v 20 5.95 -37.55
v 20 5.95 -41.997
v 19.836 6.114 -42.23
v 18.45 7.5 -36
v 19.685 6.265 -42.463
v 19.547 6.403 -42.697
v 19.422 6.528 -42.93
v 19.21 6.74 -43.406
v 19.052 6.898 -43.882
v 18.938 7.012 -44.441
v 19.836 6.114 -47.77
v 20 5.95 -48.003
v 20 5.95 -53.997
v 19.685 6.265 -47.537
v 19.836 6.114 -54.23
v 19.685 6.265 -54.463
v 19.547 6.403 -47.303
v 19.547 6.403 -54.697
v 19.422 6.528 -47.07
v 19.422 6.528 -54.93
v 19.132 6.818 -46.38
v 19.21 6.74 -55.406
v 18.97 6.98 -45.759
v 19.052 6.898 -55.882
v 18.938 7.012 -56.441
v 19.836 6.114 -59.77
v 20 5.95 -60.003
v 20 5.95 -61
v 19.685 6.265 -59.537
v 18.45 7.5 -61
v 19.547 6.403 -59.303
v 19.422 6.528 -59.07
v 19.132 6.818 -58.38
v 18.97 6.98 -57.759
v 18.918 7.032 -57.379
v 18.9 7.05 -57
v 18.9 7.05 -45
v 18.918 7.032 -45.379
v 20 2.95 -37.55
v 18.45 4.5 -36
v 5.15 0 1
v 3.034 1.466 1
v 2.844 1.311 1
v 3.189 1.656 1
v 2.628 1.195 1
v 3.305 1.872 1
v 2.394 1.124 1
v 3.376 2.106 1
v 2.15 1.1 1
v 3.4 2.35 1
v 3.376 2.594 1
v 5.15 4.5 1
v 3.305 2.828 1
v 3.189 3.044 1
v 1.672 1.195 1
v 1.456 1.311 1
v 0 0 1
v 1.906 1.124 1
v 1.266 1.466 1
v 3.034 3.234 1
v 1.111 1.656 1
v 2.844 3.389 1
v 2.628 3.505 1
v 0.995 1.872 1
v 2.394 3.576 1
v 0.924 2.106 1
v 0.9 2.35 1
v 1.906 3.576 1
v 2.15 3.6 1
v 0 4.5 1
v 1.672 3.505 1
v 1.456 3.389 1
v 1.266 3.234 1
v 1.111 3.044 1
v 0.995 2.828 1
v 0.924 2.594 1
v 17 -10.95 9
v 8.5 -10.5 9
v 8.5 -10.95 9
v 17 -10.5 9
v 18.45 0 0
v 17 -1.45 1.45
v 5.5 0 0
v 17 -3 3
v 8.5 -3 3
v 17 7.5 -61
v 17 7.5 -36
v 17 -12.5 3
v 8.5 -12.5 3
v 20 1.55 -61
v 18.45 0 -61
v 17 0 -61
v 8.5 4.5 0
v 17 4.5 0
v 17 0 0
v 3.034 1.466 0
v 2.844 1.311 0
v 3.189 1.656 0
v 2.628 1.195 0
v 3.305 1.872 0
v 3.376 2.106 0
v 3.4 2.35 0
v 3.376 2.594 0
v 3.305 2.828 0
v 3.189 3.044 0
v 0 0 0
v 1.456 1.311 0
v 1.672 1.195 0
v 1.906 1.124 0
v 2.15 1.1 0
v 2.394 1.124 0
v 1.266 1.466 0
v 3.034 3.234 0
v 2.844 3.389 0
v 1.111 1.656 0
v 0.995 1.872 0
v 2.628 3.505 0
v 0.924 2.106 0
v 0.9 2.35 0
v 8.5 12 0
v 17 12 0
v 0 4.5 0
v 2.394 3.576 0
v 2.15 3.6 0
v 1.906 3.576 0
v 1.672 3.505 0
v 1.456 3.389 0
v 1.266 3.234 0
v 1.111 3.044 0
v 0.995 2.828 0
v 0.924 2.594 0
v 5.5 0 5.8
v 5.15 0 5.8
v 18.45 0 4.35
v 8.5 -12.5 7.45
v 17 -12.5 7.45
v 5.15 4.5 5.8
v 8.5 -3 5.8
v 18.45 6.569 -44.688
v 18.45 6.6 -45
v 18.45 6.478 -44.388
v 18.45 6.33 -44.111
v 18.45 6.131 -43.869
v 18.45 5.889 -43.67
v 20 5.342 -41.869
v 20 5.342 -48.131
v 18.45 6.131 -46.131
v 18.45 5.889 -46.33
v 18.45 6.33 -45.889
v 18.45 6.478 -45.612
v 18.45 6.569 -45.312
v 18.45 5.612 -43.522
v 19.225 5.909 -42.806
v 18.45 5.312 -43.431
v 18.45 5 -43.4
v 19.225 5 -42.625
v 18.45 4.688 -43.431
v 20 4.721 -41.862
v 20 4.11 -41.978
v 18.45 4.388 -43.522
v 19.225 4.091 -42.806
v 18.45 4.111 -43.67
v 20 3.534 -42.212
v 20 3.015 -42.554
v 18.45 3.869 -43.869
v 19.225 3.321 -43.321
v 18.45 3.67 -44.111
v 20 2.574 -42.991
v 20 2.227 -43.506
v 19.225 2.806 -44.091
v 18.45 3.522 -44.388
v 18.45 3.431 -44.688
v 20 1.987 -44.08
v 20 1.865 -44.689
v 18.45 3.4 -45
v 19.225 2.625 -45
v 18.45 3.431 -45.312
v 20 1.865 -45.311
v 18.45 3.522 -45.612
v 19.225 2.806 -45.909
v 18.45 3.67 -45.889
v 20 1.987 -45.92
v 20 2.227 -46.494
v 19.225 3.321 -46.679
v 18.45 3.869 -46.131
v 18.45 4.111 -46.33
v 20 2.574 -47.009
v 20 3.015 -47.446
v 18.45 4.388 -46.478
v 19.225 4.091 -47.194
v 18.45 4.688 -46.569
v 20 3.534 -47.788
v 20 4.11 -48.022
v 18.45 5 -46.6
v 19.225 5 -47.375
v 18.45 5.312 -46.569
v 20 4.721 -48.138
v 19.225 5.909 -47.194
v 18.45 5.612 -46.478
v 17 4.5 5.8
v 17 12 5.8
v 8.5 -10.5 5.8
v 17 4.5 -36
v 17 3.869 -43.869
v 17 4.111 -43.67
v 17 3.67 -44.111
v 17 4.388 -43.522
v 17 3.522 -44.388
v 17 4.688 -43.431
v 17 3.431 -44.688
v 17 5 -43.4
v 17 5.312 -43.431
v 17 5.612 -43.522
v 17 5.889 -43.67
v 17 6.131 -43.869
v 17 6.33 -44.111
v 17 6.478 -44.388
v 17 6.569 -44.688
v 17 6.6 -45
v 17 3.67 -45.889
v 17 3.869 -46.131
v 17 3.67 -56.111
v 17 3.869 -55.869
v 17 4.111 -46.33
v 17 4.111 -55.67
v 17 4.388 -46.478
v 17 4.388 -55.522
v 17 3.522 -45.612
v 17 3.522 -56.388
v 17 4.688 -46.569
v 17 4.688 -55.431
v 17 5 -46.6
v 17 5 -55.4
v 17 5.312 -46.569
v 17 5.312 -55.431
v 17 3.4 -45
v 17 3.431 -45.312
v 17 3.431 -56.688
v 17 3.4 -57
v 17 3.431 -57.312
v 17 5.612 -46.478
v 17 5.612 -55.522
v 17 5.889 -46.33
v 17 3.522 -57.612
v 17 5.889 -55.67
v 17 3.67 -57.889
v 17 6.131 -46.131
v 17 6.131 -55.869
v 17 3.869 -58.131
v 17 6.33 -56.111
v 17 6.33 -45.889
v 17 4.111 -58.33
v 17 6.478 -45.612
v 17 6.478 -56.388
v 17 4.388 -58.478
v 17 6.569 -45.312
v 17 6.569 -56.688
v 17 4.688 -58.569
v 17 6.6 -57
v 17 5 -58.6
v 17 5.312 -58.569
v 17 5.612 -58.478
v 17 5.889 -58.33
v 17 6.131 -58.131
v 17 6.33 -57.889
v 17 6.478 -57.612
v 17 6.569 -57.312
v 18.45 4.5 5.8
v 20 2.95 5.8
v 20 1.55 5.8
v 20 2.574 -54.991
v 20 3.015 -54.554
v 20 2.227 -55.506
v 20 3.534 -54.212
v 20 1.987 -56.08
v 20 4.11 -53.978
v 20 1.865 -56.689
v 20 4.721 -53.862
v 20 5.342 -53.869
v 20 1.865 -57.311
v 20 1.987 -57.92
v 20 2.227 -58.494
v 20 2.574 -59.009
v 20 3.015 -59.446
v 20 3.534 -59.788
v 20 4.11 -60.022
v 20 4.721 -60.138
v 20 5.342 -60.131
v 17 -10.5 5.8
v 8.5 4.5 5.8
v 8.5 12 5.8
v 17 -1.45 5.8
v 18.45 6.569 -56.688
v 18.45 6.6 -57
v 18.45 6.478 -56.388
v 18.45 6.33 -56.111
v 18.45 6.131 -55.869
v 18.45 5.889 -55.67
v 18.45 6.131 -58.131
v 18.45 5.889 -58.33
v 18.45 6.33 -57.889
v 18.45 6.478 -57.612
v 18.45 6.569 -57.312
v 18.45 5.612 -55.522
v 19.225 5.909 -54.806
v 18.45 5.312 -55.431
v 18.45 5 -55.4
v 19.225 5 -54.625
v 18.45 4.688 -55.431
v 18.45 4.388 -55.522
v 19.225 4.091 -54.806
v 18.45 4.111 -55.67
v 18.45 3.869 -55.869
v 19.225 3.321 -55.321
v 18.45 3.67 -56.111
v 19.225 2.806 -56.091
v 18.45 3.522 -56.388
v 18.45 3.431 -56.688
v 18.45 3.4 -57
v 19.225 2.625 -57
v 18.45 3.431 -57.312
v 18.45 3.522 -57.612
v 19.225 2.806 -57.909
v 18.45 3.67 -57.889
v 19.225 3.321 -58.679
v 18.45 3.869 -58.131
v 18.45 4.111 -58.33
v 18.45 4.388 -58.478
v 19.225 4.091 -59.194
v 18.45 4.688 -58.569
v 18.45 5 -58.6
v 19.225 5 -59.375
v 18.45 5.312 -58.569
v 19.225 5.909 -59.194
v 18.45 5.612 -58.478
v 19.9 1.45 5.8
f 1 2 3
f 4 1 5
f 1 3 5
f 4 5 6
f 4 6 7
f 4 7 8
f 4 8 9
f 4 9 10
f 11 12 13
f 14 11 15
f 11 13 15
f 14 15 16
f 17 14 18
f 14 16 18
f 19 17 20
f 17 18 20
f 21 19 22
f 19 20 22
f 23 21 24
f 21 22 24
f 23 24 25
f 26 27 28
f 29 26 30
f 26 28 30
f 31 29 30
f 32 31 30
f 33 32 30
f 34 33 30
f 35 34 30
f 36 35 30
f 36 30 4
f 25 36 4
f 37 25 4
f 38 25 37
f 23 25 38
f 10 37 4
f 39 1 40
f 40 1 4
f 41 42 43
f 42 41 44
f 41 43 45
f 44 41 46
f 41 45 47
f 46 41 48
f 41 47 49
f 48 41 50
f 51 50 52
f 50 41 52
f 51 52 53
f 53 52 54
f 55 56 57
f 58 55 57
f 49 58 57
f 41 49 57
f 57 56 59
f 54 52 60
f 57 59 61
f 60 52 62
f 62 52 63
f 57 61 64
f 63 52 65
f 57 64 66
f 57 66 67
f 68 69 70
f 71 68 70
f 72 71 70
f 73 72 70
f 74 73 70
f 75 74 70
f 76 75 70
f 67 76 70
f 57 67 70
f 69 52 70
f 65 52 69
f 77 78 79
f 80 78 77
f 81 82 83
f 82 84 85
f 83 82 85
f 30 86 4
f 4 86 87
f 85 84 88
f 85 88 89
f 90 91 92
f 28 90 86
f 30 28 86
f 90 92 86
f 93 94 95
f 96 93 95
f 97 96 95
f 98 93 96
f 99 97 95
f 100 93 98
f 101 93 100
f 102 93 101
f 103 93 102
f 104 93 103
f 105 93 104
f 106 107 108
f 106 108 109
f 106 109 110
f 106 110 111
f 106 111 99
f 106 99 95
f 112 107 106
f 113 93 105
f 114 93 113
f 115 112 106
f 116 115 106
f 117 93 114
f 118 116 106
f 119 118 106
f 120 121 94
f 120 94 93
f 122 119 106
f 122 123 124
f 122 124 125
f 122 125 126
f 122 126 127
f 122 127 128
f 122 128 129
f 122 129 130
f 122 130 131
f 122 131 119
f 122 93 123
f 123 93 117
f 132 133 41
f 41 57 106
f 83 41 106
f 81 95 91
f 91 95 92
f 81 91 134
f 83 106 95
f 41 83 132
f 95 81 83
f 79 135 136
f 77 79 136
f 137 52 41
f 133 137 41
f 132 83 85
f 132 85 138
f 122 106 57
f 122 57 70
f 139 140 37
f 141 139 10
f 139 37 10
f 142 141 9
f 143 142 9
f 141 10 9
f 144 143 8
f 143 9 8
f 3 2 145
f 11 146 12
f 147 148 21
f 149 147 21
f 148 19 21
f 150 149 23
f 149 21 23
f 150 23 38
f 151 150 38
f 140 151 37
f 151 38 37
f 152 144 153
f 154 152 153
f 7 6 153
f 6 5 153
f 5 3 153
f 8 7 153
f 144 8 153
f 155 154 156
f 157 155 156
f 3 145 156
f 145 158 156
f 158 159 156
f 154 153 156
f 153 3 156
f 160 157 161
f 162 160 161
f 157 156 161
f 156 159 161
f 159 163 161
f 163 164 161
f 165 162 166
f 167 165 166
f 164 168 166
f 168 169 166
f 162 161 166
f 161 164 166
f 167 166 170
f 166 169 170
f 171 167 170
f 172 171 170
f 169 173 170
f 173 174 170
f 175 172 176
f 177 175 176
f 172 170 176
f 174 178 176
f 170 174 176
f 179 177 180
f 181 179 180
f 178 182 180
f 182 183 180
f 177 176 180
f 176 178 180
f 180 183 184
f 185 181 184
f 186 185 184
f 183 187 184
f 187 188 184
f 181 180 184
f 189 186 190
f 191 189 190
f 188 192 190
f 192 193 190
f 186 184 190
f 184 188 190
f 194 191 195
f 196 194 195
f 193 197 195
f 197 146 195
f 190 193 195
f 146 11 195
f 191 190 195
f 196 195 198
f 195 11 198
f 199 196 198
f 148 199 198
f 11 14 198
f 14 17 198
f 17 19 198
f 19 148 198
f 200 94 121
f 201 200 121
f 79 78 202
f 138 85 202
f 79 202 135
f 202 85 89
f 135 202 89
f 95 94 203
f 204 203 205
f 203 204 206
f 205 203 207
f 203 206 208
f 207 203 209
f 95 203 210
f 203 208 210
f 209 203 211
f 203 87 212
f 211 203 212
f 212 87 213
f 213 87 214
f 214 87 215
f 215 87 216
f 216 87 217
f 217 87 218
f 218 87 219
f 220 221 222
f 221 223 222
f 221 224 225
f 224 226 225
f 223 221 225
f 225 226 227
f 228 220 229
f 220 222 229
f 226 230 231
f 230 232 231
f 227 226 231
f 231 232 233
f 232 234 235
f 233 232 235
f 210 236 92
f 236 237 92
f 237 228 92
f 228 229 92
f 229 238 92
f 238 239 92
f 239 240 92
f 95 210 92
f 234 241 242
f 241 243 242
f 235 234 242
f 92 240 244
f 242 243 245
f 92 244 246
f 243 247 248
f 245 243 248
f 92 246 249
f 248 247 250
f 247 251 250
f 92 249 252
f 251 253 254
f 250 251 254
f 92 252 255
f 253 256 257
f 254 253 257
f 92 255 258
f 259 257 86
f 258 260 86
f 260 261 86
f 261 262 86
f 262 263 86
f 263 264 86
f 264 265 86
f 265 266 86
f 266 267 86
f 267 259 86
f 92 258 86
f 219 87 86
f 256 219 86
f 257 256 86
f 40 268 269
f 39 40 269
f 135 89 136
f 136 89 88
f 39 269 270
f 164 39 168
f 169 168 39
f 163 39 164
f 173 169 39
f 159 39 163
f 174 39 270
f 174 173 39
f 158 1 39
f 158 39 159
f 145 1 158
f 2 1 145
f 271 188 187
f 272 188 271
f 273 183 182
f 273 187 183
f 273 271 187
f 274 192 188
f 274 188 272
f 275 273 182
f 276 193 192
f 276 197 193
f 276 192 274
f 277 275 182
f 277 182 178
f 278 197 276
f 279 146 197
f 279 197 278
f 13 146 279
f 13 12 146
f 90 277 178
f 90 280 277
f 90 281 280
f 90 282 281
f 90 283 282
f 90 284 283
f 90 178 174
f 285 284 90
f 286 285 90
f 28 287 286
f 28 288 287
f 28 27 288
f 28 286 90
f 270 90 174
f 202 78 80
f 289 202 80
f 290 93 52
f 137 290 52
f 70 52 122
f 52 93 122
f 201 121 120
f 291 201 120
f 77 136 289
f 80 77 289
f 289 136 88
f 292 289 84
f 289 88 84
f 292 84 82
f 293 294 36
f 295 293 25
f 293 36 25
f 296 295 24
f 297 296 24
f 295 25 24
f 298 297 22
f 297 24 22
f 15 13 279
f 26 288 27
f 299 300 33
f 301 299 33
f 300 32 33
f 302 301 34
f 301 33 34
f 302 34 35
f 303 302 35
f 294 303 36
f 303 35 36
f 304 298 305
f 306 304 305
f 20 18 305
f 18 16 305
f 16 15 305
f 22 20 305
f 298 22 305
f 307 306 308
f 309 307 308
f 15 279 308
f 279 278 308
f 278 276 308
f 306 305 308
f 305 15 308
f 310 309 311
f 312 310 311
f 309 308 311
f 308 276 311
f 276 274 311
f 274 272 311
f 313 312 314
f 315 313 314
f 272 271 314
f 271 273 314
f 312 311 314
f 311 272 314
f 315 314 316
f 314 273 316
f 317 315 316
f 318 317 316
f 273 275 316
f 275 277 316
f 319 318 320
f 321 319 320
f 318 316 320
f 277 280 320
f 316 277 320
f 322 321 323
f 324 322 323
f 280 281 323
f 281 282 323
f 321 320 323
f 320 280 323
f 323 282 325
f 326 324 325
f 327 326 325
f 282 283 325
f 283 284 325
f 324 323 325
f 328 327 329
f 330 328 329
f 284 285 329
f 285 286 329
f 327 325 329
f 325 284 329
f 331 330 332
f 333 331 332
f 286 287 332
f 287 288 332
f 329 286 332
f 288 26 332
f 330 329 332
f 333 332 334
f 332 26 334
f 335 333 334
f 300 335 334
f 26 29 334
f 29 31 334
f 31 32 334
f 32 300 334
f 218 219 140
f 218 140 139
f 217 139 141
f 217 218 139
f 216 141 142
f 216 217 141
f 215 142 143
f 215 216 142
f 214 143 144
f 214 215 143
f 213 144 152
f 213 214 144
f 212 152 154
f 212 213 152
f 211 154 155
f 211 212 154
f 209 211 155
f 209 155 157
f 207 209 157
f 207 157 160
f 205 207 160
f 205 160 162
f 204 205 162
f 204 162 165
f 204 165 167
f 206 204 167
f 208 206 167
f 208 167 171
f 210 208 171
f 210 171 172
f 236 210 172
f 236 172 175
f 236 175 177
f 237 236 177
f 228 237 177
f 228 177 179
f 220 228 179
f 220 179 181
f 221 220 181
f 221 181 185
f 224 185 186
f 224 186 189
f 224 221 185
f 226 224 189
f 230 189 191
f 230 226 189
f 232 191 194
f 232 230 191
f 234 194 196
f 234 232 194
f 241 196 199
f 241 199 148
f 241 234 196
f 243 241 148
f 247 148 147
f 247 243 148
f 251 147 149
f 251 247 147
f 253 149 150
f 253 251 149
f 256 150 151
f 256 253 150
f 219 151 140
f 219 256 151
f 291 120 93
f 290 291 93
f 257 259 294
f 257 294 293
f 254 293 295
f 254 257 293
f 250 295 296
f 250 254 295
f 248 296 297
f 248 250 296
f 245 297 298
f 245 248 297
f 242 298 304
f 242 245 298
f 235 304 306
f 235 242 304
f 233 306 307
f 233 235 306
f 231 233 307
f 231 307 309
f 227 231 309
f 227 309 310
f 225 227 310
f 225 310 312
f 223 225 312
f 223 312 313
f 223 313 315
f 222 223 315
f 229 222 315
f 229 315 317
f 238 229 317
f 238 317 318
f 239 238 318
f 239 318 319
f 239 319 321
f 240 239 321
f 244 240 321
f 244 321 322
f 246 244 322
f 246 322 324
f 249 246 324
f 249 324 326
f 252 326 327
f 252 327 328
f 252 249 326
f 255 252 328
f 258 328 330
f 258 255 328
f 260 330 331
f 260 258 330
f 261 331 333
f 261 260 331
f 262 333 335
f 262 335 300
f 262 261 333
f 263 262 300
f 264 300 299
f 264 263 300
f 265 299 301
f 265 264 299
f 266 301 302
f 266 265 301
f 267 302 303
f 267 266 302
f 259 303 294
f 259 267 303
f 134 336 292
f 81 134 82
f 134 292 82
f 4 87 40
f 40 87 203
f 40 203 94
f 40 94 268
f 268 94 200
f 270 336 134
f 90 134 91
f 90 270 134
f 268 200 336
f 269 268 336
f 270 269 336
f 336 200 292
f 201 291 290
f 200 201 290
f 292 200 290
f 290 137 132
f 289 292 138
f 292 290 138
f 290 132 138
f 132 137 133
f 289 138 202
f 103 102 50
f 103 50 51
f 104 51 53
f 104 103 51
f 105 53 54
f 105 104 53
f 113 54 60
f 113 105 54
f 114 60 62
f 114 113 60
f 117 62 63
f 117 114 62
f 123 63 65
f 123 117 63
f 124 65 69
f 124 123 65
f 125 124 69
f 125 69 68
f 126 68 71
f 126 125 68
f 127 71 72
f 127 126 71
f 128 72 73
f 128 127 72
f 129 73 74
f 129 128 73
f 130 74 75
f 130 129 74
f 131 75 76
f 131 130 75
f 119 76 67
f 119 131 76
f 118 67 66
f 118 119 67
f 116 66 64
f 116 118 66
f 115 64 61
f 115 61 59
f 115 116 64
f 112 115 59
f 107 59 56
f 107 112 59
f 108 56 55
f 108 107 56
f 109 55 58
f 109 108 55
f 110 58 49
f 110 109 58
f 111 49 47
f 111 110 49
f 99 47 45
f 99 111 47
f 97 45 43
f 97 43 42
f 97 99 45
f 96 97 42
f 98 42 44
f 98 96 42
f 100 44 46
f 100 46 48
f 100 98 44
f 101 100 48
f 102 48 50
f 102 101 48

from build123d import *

# Parameters (mm, degrees)
SKETCH1_R           = 1.25
BOSS_EXTRUDE1_DEPTH = 1
BOSS_EXTRUDE2_DEPTH = 8
CUT_EXTRUDE1_DEPTH  = 3.2
SKETCH4_R           = 1.6
BOSS_EXTRUDE3_DEPTH = 3
CHAMFER1_SIZE       = 1.55
CHAMFER2_SIZE       = 1.55
CHAMFER3_SIZE       = 1.55
SKETCH5_W           = 8.5
SKETCH5_H           = 12.5
CUT_EXTRUDE2_DEPTH  = 3
CHAMFER4_SIZE       = 3
CHAMFER5_SIZE       = 1.45
SKETCH6_W           = 8.5
SKETCH6_H           = 3.2
CUT_EXTRUDE3_DEPTH  = 69.023892861


# Some blends are built 0.0001 mm under size
with BuildPart() as part:
    # Sketch1 → Boss-Extrude1 (new body)
    with BuildSketch(Plane.XY):
        Polygon((0, 0), (0, 4.5), (8.5, 4.5), (8.5, 12), (17, 12), (17, 0), (17, -12.5), (8.5, -12.5), (8.5, 0), align=None)
        with Locations((2.15, 2.35)):
            Circle(SKETCH1_R, mode=Mode.SUBTRACT)
    extrude(amount=BOSS_EXTRUDE1_DEPTH)

    # Sketch2 → Boss-Extrude2 (add)
    with BuildSketch(Plane.XY.offset(1)):
        Polygon((5.15, 4.5), (5.15, 0), (8.5, 0), (8.5, -12.5), (17, -12.5), (17, 12), (8.5, 12), (8.5, 4.5), align=None)
    extrude(amount=BOSS_EXTRUDE2_DEPTH)

    # Sketch3 → Cut-Extrude1 (cut)
    with BuildSketch(Plane.XY.offset(9)):
        Polygon((8.5, 10), (17, 10), (17, -10.5), (8.5, -10.5), (5.15, -10.5), (5.15, 4.5), (8.5, 4.5), align=None)
    extrude(amount=-CUT_EXTRUDE1_DEPTH, mode=Mode.SUBTRACT)

    # Sketch4 → Boss-Extrude3 (add)
    with BuildSketch(Plane(origin=(17, 0, 0), x_dir=(0, 0, -1), z_dir=(1, 0, 0))):
        Polygon((-5.8, 0), (61, 0), (61, 4.5), (61, 7.5), (36, 7.5), (36, 4.5), (-5.8, 4.5), align=None)
        with Locations(Location((57, 5, 0), (0, 0, 90))):
            Circle(SKETCH4_R, mode=Mode.SUBTRACT)
        with Locations(Location((45, 5, 0), (0, 0, 90))):
            Circle(SKETCH4_R, mode=Mode.SUBTRACT)
    extrude(amount=BOSS_EXTRUDE3_DEPTH)

    # Chamfer1
    # the kernel refuses this chamfer: 1.55 mm, written as the material it takes off along each edge
    with BuildSketch(Plane(origin=(20, 5, -57), x_dir=(0, 1, 0), z_dir=(0, 0, -1))) as chamfer1_piece_1:
        Polygon((1.6, -CHAMFER1_SIZE), (1.6 + CHAMFER1_SIZE, 0), (1.6, 0), align=None)
    revolve(axis=Axis((20, 5, -57), (1, 0, 0)), mode=Mode.SUBTRACT)
    with BuildSketch(Plane(origin=(20, 5, -45), x_dir=(0, 1, 0), z_dir=(0, 0, -1))) as chamfer1_piece_2:
        Polygon((1.6, -CHAMFER1_SIZE), (1.6 + CHAMFER1_SIZE, 0), (1.6, 0), align=None)
    revolve(axis=Axis((20, 5, -45), (1, 0, 0)), mode=Mode.SUBTRACT)

    # Chamfer2
    # the kernel refuses this chamfer: 1.55 mm, written as the material it takes off along each edge
    with BuildSketch(Plane(origin=(20, 7.5, -59.069731842), x_dir=(0.027495876610587087, -0.9996219169112966, 0), z_dir=(0, 0, 1))) as chamfer2_piece_1:
        Polygon((CHAMFER2_SIZE * 0.999621916911, -CHAMFER2_SIZE * 0.0274958766106), (-CHAMFER2_SIZE * 0.0274958766106, -CHAMFER2_SIZE * 0.999621916911), (0, 0), align=None)
    extrude(amount=16.139463683, mode=Mode.SUBTRACT)
    with BuildSketch(Plane(origin=(20, 7.5, -47.069731842), x_dir=(0.027495876610587087, -0.9996219169112966, 0), z_dir=(0, 0, 1))) as chamfer2_piece_2:
        Polygon((CHAMFER2_SIZE * 0.999621916911, -CHAMFER2_SIZE * 0.0274958766106), (-CHAMFER2_SIZE * 0.0274958766106, -CHAMFER2_SIZE * 0.999621916911), (0, 0), align=None)
    extrude(amount=15.055840473, mode=Mode.SUBTRACT)
    with BuildSketch(Plane(origin=(20.986108631, 12, 9), x_dir=(0, 0.02749587661058596, -0.9996219169112966), z_dir=(-1, 0, 0))) as chamfer2_piece_3:
        Polygon((CHAMFER2_SIZE * 0.999621916911, CHAMFER2_SIZE * 0.0274958766106), (-CHAMFER2_SIZE * 0.0274958766106, CHAMFER2_SIZE * 0.999621916911), (0, 0), align=None)
    extrude(amount=16.472217263, mode=Mode.SUBTRACT)
    with BuildSketch(Plane(origin=(20, 7.5, -64.986108631), x_dir=(0.027495876610587087, -0.9996219169112966, 0), z_dir=(0, 0, 1))) as chamfer2_piece_4:
        Polygon((CHAMFER2_SIZE * 0.999621916911, -CHAMFER2_SIZE * 0.0274958766106), (-CHAMFER2_SIZE * 0.0274958766106, -CHAMFER2_SIZE * 0.999621916911), (0, 0), align=None)
    extrude(amount=10.055840473, mode=Mode.SUBTRACT)
    with BuildSketch(Plane(origin=(20, 11.486108631, -36), x_dir=(0.027495876610587163, 0, -0.9996219169112966), z_dir=(0, -1, 0))) as chamfer2_piece_5:
        Polygon((CHAMFER2_SIZE * 0.999621916911, -CHAMFER2_SIZE * 0.0274958766106), (-CHAMFER2_SIZE * 0.0274958766106, -CHAMFER2_SIZE * 0.999621916911), (0, 0), align=None)
    extrude(amount=6.986108631, mode=Mode.SUBTRACT)
    with BuildSketch(Plane(origin=(20, 4.5, -36), x_dir=(-0.9996219169112966, 0.027495876610585928, 0), z_dir=(0, 0, 1))) as chamfer2_piece_6:
        Polygon((CHAMFER2_SIZE * 0.999621916911, CHAMFER2_SIZE * 0.0274958766106), (-CHAMFER2_SIZE * 0.0274958766106, CHAMFER2_SIZE * 0.999621916911), (0, 0), align=None)
    extrude(amount=45.786108631, mode=Mode.SUBTRACT)
    with BuildSketch(Plane(origin=(20, 4.5, -39.986108631), x_dir=(-0.9996219169112966, 0.027495876610585928, 0), z_dir=(0, 0, 1))) as chamfer2_piece_7a_section:
        Polygon((CHAMFER2_SIZE * 0.999621916911, CHAMFER2_SIZE * 0.0274958766106), (-CHAMFER2_SIZE * 0.0274958766106, CHAMFER2_SIZE * 0.999621916911), (0, 0), align=None)
    chamfer2_piece_7a = extrude(amount=49.772217263, mode=Mode.PRIVATE)
    chamfer2_piece_7a = split(chamfer2_piece_7a, bisect_by=Plane(origin=(19.488819878, 3.988819878, -36), z_dir=(0, 0, -1)), keep=Keep.TOP, mode=Mode.PRIVATE)
    with BuildSketch(Plane(origin=(20, 11.486108631, -36), x_dir=(0.027495876610587163, 0, -0.9996219169112966), z_dir=(0, -1, 0))) as chamfer2_piece_7b_section:
        Polygon((CHAMFER2_SIZE * 0.999621916911, -CHAMFER2_SIZE * 0.0274958766106), (-CHAMFER2_SIZE * 0.0274958766106, -CHAMFER2_SIZE * 0.999621916911), (0, 0), align=None)
    chamfer2_piece_7b = extrude(amount=10.972217263, mode=Mode.PRIVATE)
    chamfer2_piece_7b = split(chamfer2_piece_7b, bisect_by=Plane(origin=(19.488819878, 4.5, -36.511180122), z_dir=(0, -1, 0)), keep=Keep.TOP, mode=Mode.PRIVATE)
    chamfer2_piece_7 = chamfer2_piece_7a & chamfer2_piece_7b
    add(chamfer2_piece_7, mode=Mode.SUBTRACT)

    # Chamfer3
    chamfer3_edges = [part.edges().sort_by_distance(p)[0] for p in [
        (12.75, -12.5, 9),
        (20, 0, -27.6),
    ]]
    chamfer(chamfer3_edges, length=CHAMFER3_SIZE)

    # Sketch5 → Cut-Extrude2 (cut)
    with BuildSketch(Plane(origin=(0, 0, 0), x_dir=(-1, 0, 0), z_dir=(0, 0, -1))):
        with Locations((-12.75, -6.25)):
            Rectangle(SKETCH5_W, SKETCH5_H)
    extrude(amount=-CUT_EXTRUDE2_DEPTH, mode=Mode.SUBTRACT)

    # Chamfer4
    chamfer4_edges = [part.edges().sort_by_distance(p)[0] for p in [
        (12.75, 0, 3),
        (8.5, 0, 4.4),
    ]]
    chamfer(chamfer4_edges, length=CHAMFER4_SIZE - 0.0001)  # a hair under: the kernel refuses the full size

    # Chamfer5
    chamfer5_edges = [part.edges().sort_by_distance(p)[0] for p in [
        (17, 0, 2.90005),
    ]]
    chamfer(chamfer5_edges, length=CHAMFER5_SIZE - 0.0001)  # a hair under: the kernel refuses the full size
    chamfer5_2_edges = [part.edges().sort_by_distance(p)[0] for p in [
        (18.44995, 0, 5.8),
    ]]
    chamfer(chamfer5_2_edges, length=CHAMFER5_SIZE)

    # Sketch6 → Cut-Extrude3 (cut, through all)
    with BuildSketch(Plane.XZ.offset(-10)):
        with Locations((12.75, 7.4)):
            Rectangle(SKETCH6_W, SKETCH6_H)
    extrude(amount=-CUT_EXTRUDE3_DEPTH, mode=Mode.SUBTRACT)


solid = part.part
